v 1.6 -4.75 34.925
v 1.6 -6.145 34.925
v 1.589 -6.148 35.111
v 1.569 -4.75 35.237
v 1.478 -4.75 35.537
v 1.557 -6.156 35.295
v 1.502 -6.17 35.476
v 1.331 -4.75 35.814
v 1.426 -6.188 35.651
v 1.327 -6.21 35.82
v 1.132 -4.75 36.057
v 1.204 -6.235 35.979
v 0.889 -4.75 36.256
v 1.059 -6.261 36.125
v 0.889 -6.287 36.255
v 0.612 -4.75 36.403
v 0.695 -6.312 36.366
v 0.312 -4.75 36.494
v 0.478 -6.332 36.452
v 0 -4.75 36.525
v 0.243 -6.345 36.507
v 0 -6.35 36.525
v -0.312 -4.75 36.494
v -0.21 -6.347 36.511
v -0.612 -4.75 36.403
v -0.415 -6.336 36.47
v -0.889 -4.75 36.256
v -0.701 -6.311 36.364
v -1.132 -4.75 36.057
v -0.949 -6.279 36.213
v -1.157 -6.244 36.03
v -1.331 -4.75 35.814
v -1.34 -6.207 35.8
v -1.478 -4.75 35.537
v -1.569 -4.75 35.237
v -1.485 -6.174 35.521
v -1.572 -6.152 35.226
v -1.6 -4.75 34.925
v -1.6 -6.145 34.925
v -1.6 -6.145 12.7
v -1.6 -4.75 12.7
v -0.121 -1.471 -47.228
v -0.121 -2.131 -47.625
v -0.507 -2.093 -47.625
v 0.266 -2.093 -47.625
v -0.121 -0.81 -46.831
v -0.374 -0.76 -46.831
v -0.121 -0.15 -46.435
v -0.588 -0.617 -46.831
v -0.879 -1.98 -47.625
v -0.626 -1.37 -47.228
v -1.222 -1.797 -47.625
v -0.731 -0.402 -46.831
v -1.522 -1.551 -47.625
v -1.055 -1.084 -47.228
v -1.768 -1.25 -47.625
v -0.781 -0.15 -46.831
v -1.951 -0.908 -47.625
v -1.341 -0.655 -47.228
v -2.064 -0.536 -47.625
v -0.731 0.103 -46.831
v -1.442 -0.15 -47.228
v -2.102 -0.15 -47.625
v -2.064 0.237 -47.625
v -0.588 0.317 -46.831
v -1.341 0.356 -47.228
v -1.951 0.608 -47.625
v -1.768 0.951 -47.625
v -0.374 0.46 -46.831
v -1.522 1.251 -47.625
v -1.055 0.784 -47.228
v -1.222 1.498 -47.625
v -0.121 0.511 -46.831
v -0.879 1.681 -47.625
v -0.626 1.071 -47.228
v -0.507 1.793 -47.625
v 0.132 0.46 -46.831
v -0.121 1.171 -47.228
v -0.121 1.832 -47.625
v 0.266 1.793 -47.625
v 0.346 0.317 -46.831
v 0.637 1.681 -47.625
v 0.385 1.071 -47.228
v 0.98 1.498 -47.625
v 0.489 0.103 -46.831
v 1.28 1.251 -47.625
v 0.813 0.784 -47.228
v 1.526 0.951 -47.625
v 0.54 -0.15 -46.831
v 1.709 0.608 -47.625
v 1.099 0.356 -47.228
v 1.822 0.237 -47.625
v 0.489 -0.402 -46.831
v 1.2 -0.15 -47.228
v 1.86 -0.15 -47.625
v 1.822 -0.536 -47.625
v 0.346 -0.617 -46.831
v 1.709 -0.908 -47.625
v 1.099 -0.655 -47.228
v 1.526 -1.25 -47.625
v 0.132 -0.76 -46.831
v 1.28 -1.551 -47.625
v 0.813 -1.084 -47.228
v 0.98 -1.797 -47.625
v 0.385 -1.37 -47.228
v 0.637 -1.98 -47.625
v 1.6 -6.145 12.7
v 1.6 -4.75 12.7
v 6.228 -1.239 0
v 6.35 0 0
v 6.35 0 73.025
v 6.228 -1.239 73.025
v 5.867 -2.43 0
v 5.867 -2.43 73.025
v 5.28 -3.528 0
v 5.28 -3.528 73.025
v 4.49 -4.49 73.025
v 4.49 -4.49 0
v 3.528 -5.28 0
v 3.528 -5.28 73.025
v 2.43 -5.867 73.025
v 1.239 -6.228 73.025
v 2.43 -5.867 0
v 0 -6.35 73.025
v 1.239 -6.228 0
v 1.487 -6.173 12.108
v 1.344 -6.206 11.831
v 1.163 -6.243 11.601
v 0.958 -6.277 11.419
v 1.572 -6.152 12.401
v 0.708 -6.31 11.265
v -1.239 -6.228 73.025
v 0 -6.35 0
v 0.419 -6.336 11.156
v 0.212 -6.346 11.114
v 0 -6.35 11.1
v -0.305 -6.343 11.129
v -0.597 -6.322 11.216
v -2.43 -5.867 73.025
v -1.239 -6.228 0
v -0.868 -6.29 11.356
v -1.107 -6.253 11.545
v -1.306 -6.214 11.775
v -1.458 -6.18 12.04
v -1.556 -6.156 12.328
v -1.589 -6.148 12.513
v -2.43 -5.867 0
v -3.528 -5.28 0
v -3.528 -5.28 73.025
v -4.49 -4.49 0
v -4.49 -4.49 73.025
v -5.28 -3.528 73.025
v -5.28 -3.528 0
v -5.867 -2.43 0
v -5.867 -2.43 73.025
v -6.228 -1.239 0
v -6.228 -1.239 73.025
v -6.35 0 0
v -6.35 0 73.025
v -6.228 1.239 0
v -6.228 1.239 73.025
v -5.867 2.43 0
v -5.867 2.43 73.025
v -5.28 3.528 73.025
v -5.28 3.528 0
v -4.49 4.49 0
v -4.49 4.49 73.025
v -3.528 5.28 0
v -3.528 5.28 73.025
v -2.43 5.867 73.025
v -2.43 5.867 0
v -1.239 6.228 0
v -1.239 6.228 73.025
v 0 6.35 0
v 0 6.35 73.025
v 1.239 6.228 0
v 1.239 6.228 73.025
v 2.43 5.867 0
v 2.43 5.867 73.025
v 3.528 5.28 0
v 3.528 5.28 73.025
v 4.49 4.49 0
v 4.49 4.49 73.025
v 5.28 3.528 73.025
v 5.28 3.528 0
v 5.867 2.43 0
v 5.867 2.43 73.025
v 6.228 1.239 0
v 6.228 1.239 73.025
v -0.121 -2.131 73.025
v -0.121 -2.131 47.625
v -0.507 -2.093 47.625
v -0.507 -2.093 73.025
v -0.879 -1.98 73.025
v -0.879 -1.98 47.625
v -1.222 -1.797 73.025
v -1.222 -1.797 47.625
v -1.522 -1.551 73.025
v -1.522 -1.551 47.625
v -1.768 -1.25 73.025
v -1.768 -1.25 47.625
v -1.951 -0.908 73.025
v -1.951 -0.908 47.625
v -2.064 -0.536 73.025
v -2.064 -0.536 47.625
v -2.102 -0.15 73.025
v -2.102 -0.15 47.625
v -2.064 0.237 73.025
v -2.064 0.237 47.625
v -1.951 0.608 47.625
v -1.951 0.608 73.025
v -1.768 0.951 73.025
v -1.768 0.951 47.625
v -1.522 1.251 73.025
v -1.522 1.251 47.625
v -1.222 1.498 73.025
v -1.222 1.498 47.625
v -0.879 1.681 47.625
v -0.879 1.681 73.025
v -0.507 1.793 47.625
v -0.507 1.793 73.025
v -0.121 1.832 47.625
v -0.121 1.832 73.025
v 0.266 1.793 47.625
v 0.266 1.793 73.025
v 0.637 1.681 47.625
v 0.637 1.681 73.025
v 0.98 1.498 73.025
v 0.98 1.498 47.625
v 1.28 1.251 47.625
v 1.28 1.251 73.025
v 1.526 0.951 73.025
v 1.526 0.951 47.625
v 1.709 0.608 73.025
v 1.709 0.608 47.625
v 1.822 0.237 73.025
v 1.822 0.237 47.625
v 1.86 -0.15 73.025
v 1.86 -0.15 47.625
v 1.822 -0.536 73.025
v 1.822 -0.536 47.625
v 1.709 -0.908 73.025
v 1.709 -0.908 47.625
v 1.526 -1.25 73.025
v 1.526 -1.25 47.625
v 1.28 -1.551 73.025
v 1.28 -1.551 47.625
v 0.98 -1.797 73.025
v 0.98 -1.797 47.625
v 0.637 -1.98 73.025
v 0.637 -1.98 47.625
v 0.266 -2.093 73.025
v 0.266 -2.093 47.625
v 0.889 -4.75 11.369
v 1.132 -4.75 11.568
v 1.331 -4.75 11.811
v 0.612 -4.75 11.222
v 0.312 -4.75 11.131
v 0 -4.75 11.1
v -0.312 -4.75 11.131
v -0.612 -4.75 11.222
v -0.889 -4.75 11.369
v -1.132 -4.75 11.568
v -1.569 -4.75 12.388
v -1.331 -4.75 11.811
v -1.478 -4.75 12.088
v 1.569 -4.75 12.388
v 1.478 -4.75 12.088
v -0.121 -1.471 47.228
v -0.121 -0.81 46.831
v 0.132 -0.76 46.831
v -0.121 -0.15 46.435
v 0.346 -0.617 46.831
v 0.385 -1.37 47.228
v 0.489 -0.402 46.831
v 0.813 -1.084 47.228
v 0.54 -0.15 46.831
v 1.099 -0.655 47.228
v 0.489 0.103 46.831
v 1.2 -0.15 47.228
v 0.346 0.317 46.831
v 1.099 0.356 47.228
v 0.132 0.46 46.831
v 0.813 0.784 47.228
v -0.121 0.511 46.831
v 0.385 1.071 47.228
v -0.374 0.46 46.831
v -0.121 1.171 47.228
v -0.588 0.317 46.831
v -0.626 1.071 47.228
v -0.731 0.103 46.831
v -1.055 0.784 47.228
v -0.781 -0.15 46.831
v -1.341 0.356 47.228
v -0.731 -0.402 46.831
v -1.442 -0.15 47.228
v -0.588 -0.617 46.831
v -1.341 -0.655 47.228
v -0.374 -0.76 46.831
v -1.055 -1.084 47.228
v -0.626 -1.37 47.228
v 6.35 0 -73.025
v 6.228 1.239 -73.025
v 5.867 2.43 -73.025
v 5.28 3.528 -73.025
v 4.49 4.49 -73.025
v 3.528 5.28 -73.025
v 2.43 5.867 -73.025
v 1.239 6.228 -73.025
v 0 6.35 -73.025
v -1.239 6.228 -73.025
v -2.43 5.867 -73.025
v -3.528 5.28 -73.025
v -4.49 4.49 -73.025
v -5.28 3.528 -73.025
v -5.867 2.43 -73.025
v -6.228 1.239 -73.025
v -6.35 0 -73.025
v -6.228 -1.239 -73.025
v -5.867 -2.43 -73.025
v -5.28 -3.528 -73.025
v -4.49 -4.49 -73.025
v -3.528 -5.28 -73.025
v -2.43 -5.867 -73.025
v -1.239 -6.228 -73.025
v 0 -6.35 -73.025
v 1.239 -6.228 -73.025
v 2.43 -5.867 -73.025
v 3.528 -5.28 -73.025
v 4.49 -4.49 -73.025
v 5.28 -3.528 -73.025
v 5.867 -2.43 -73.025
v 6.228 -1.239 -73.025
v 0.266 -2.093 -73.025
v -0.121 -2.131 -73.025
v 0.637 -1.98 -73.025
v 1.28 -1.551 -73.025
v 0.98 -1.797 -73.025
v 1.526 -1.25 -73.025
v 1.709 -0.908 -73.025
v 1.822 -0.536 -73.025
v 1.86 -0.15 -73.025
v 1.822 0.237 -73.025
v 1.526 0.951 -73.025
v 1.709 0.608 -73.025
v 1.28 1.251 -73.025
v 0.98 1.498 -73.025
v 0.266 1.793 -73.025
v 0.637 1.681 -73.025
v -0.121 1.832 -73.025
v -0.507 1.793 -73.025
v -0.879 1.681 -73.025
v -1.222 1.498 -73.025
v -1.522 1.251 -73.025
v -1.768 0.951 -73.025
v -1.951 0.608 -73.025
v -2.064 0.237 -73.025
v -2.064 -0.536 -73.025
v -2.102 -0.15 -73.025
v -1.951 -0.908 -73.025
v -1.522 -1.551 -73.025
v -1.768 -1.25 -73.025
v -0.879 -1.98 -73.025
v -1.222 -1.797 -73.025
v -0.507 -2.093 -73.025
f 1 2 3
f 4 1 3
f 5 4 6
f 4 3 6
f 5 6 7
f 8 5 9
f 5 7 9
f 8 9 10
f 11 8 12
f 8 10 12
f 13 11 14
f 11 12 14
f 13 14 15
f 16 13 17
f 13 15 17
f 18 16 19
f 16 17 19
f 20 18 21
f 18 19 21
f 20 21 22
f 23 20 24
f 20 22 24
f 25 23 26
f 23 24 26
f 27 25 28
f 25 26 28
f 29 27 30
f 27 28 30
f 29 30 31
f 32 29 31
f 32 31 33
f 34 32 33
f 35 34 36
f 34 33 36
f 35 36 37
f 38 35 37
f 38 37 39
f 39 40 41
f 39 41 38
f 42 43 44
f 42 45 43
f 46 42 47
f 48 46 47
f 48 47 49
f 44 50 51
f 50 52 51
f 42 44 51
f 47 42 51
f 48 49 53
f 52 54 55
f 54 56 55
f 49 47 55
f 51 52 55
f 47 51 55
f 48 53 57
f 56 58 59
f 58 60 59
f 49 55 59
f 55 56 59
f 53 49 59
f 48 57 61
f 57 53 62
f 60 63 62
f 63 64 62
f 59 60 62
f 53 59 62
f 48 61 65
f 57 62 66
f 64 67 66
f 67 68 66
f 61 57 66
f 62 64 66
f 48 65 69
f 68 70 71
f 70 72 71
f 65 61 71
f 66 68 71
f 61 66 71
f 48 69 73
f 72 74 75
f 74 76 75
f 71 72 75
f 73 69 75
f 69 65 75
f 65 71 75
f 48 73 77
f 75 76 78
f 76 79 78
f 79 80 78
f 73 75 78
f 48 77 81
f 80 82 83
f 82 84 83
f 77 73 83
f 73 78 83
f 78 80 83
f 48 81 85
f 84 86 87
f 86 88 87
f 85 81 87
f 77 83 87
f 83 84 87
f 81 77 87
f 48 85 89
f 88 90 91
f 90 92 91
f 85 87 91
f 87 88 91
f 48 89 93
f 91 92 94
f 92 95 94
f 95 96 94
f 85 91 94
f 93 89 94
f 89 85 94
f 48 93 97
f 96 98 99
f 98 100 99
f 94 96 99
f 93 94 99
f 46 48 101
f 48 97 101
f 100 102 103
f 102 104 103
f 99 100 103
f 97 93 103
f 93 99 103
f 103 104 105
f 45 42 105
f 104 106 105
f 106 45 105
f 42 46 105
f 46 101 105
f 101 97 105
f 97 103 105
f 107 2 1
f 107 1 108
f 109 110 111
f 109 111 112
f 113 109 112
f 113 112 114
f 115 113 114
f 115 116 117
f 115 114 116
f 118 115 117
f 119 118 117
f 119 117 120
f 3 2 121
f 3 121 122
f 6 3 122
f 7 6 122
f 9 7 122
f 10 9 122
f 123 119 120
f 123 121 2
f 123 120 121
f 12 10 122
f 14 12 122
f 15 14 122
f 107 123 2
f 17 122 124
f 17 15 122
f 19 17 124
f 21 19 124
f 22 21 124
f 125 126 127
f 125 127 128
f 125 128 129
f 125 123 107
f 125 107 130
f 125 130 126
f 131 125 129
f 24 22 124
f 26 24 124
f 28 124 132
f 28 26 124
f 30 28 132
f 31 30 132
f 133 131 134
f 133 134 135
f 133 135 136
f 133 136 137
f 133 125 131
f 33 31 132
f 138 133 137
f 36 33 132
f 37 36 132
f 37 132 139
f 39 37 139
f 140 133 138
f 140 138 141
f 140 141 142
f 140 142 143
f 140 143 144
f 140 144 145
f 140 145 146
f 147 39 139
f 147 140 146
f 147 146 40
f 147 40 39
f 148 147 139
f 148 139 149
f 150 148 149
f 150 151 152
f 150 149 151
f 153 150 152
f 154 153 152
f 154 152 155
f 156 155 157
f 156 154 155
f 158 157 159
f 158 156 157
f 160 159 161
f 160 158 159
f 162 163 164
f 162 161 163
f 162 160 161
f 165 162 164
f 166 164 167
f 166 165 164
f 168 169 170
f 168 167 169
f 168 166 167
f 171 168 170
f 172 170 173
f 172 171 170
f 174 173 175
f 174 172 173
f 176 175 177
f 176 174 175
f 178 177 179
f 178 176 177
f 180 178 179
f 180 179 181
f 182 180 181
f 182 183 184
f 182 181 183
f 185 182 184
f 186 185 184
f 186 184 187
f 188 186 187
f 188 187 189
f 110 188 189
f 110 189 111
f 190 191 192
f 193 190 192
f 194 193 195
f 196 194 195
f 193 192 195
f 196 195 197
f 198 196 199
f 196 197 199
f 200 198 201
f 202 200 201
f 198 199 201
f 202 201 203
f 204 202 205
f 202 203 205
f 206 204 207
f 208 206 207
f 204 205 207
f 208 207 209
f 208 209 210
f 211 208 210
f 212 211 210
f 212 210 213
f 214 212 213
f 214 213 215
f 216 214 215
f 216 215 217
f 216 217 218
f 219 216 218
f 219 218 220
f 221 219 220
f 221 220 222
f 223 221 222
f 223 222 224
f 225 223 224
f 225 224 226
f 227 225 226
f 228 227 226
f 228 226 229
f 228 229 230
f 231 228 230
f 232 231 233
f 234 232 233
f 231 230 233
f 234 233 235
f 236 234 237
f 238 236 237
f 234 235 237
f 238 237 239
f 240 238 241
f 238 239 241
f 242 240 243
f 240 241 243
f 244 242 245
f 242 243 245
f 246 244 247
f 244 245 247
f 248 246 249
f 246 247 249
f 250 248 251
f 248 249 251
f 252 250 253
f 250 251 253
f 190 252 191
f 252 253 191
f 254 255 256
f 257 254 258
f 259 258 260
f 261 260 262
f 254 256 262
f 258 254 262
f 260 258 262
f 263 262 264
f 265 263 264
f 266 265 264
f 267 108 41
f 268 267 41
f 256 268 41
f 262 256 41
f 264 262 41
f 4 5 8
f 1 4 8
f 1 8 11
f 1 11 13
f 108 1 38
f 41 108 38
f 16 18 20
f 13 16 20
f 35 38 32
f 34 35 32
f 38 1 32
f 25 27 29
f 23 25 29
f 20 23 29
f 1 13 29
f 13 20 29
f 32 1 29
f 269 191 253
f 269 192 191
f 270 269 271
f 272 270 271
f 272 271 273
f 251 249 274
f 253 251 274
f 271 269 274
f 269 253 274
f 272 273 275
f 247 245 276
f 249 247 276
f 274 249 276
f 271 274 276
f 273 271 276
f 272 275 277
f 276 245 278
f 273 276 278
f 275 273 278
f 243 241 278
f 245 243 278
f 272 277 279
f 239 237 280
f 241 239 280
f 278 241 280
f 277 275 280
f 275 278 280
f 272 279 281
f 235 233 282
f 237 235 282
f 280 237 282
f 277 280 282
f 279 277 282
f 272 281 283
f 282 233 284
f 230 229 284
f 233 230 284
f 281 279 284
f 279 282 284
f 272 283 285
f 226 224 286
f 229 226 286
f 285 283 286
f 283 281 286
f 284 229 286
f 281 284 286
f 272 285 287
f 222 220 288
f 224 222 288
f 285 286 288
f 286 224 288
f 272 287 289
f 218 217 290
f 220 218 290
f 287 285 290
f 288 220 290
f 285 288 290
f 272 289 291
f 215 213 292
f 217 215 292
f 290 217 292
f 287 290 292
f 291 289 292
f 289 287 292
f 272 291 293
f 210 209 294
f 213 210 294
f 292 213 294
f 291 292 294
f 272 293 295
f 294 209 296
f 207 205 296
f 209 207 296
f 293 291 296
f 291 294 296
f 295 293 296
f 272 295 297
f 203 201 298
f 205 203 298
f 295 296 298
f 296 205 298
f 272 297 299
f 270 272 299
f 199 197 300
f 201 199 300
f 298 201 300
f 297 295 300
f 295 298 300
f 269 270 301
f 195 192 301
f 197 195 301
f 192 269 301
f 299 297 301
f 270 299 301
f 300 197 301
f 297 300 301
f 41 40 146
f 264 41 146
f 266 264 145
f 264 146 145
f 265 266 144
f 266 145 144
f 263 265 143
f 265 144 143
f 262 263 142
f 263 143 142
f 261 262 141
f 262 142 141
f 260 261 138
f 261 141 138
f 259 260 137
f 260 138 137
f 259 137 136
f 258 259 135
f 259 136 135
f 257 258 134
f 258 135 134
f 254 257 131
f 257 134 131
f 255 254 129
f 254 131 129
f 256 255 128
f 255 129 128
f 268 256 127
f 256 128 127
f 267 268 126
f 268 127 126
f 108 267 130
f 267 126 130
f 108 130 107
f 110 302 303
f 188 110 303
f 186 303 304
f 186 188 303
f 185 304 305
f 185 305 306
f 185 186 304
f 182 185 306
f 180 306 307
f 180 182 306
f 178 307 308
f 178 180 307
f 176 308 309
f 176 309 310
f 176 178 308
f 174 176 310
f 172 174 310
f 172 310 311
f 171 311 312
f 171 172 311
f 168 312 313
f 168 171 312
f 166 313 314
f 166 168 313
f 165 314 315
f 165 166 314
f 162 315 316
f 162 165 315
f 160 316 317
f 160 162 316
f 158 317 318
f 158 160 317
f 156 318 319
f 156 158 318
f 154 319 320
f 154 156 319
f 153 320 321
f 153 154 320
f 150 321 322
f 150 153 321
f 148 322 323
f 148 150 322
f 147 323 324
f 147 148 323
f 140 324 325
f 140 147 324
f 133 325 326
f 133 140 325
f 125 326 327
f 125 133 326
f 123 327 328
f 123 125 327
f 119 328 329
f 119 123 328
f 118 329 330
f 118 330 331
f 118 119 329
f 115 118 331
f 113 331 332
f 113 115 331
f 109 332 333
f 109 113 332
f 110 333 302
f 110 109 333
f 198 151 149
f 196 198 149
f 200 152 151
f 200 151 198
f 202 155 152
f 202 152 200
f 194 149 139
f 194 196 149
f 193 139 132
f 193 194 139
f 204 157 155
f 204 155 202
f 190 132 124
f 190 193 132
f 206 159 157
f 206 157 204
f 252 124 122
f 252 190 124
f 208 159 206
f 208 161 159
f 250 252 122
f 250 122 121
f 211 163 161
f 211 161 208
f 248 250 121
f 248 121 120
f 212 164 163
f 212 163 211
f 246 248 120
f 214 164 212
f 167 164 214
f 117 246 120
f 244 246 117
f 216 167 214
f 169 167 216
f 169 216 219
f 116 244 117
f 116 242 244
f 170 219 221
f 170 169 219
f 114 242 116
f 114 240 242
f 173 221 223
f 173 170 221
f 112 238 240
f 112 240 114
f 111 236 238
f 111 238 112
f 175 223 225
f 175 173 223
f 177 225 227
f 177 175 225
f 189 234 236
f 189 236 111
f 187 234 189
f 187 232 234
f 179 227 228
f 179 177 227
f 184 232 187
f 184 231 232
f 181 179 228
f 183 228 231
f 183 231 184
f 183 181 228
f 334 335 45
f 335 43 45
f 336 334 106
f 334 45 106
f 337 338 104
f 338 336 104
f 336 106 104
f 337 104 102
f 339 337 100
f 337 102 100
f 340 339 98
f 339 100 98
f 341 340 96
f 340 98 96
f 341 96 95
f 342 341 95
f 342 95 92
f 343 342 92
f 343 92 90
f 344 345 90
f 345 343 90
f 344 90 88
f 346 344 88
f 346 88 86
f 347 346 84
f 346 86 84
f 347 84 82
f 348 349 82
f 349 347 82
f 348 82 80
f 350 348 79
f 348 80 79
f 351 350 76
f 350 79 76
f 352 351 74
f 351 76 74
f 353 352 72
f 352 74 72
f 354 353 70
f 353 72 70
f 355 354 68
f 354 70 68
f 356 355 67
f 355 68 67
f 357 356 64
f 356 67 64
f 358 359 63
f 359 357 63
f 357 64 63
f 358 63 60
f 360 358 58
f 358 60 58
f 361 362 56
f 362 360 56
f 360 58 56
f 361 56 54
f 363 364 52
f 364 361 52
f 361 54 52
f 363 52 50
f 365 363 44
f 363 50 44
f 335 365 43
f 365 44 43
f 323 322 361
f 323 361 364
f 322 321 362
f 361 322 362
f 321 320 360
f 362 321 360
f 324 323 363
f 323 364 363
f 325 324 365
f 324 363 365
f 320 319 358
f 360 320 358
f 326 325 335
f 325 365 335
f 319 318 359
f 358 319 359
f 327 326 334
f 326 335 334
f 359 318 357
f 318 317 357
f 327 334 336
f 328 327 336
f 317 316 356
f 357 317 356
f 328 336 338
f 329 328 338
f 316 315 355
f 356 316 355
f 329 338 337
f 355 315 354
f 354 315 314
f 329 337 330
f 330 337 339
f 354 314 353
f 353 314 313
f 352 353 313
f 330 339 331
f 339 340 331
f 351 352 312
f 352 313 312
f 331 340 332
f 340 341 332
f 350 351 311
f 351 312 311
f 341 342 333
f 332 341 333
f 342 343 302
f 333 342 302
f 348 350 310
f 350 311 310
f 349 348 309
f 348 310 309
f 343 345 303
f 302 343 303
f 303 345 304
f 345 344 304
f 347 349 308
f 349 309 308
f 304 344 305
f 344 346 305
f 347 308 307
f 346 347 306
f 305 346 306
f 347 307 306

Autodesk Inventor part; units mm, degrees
ref_plane "YZ Plane" through (0, 0, 0) normal (1, 0, 0) x (0, 1, 0)
ref_plane "XY Plane" through (0, 0, 0) normal (0, 0, 1) x (1, 0, 0)
sketch "Sketch3" plane through (0, 0, 0) normal (0, 0, 1) x (1, 0, 0)
  circle A0 centre (0, 0) radius 6.35
  dimension "d0" = 12.7
extrude "Extrusion1" add sketch "Sketch3" along normal mid plane 146.05
sketch "Sketch4" plane through (0, 0, 73.025) normal (0, 0, 1) x (1, 0, 0)
  point P0 (0, 0)
  point P1 (-0.1209, -0.1497)
hole "Hole1" at (-0.1209, -0.1497, 73.025) direction (0, 0, -1) diameter 3.9624 depth 25.4 tip angle 118 thread size "10-32 UNF" class "2B" standard "ANSI Unified Screw Threads"
mirror "Mirror1" about plane through (0, 0, 0) normal (0, 0, 1) of "Hole1"
ref_plane "Work Plane1" through (0, -6.35, 0) normal (0, 1, 0) x (-1, 0, 0)
sketch "Sketch5" plane through (0, -6.35, 0) normal (0, 1, 0) x (-1, 0, 0)
  line L0 (0, 34.925) -> (0, 12.7) construction
  line L1 (-1.6002, 34.925) -> (-1.6002, 12.7)
  line L2 (1.6002, 12.7) -> (1.6002, 34.925)
  arc A0 (1.6002, 34.925) -> (-1.6002, 34.925) centre (0, 34.925) ccw
  arc A1 (-1.6002, 12.7) -> (1.6002, 12.7) centre (0, 12.7) ccw
  point P0 (0, 0)
  point P1 (0, 23.8125)
  dimension "d10" = 3.2004
  dimension "d11" = 23.8125
  dimension "d12" = 22.225
extrude "Extrusion2" cut sketch "Sketch5" along normal blind 1.6002
properties part number "1886K21_Rotary Shaft _Short"
